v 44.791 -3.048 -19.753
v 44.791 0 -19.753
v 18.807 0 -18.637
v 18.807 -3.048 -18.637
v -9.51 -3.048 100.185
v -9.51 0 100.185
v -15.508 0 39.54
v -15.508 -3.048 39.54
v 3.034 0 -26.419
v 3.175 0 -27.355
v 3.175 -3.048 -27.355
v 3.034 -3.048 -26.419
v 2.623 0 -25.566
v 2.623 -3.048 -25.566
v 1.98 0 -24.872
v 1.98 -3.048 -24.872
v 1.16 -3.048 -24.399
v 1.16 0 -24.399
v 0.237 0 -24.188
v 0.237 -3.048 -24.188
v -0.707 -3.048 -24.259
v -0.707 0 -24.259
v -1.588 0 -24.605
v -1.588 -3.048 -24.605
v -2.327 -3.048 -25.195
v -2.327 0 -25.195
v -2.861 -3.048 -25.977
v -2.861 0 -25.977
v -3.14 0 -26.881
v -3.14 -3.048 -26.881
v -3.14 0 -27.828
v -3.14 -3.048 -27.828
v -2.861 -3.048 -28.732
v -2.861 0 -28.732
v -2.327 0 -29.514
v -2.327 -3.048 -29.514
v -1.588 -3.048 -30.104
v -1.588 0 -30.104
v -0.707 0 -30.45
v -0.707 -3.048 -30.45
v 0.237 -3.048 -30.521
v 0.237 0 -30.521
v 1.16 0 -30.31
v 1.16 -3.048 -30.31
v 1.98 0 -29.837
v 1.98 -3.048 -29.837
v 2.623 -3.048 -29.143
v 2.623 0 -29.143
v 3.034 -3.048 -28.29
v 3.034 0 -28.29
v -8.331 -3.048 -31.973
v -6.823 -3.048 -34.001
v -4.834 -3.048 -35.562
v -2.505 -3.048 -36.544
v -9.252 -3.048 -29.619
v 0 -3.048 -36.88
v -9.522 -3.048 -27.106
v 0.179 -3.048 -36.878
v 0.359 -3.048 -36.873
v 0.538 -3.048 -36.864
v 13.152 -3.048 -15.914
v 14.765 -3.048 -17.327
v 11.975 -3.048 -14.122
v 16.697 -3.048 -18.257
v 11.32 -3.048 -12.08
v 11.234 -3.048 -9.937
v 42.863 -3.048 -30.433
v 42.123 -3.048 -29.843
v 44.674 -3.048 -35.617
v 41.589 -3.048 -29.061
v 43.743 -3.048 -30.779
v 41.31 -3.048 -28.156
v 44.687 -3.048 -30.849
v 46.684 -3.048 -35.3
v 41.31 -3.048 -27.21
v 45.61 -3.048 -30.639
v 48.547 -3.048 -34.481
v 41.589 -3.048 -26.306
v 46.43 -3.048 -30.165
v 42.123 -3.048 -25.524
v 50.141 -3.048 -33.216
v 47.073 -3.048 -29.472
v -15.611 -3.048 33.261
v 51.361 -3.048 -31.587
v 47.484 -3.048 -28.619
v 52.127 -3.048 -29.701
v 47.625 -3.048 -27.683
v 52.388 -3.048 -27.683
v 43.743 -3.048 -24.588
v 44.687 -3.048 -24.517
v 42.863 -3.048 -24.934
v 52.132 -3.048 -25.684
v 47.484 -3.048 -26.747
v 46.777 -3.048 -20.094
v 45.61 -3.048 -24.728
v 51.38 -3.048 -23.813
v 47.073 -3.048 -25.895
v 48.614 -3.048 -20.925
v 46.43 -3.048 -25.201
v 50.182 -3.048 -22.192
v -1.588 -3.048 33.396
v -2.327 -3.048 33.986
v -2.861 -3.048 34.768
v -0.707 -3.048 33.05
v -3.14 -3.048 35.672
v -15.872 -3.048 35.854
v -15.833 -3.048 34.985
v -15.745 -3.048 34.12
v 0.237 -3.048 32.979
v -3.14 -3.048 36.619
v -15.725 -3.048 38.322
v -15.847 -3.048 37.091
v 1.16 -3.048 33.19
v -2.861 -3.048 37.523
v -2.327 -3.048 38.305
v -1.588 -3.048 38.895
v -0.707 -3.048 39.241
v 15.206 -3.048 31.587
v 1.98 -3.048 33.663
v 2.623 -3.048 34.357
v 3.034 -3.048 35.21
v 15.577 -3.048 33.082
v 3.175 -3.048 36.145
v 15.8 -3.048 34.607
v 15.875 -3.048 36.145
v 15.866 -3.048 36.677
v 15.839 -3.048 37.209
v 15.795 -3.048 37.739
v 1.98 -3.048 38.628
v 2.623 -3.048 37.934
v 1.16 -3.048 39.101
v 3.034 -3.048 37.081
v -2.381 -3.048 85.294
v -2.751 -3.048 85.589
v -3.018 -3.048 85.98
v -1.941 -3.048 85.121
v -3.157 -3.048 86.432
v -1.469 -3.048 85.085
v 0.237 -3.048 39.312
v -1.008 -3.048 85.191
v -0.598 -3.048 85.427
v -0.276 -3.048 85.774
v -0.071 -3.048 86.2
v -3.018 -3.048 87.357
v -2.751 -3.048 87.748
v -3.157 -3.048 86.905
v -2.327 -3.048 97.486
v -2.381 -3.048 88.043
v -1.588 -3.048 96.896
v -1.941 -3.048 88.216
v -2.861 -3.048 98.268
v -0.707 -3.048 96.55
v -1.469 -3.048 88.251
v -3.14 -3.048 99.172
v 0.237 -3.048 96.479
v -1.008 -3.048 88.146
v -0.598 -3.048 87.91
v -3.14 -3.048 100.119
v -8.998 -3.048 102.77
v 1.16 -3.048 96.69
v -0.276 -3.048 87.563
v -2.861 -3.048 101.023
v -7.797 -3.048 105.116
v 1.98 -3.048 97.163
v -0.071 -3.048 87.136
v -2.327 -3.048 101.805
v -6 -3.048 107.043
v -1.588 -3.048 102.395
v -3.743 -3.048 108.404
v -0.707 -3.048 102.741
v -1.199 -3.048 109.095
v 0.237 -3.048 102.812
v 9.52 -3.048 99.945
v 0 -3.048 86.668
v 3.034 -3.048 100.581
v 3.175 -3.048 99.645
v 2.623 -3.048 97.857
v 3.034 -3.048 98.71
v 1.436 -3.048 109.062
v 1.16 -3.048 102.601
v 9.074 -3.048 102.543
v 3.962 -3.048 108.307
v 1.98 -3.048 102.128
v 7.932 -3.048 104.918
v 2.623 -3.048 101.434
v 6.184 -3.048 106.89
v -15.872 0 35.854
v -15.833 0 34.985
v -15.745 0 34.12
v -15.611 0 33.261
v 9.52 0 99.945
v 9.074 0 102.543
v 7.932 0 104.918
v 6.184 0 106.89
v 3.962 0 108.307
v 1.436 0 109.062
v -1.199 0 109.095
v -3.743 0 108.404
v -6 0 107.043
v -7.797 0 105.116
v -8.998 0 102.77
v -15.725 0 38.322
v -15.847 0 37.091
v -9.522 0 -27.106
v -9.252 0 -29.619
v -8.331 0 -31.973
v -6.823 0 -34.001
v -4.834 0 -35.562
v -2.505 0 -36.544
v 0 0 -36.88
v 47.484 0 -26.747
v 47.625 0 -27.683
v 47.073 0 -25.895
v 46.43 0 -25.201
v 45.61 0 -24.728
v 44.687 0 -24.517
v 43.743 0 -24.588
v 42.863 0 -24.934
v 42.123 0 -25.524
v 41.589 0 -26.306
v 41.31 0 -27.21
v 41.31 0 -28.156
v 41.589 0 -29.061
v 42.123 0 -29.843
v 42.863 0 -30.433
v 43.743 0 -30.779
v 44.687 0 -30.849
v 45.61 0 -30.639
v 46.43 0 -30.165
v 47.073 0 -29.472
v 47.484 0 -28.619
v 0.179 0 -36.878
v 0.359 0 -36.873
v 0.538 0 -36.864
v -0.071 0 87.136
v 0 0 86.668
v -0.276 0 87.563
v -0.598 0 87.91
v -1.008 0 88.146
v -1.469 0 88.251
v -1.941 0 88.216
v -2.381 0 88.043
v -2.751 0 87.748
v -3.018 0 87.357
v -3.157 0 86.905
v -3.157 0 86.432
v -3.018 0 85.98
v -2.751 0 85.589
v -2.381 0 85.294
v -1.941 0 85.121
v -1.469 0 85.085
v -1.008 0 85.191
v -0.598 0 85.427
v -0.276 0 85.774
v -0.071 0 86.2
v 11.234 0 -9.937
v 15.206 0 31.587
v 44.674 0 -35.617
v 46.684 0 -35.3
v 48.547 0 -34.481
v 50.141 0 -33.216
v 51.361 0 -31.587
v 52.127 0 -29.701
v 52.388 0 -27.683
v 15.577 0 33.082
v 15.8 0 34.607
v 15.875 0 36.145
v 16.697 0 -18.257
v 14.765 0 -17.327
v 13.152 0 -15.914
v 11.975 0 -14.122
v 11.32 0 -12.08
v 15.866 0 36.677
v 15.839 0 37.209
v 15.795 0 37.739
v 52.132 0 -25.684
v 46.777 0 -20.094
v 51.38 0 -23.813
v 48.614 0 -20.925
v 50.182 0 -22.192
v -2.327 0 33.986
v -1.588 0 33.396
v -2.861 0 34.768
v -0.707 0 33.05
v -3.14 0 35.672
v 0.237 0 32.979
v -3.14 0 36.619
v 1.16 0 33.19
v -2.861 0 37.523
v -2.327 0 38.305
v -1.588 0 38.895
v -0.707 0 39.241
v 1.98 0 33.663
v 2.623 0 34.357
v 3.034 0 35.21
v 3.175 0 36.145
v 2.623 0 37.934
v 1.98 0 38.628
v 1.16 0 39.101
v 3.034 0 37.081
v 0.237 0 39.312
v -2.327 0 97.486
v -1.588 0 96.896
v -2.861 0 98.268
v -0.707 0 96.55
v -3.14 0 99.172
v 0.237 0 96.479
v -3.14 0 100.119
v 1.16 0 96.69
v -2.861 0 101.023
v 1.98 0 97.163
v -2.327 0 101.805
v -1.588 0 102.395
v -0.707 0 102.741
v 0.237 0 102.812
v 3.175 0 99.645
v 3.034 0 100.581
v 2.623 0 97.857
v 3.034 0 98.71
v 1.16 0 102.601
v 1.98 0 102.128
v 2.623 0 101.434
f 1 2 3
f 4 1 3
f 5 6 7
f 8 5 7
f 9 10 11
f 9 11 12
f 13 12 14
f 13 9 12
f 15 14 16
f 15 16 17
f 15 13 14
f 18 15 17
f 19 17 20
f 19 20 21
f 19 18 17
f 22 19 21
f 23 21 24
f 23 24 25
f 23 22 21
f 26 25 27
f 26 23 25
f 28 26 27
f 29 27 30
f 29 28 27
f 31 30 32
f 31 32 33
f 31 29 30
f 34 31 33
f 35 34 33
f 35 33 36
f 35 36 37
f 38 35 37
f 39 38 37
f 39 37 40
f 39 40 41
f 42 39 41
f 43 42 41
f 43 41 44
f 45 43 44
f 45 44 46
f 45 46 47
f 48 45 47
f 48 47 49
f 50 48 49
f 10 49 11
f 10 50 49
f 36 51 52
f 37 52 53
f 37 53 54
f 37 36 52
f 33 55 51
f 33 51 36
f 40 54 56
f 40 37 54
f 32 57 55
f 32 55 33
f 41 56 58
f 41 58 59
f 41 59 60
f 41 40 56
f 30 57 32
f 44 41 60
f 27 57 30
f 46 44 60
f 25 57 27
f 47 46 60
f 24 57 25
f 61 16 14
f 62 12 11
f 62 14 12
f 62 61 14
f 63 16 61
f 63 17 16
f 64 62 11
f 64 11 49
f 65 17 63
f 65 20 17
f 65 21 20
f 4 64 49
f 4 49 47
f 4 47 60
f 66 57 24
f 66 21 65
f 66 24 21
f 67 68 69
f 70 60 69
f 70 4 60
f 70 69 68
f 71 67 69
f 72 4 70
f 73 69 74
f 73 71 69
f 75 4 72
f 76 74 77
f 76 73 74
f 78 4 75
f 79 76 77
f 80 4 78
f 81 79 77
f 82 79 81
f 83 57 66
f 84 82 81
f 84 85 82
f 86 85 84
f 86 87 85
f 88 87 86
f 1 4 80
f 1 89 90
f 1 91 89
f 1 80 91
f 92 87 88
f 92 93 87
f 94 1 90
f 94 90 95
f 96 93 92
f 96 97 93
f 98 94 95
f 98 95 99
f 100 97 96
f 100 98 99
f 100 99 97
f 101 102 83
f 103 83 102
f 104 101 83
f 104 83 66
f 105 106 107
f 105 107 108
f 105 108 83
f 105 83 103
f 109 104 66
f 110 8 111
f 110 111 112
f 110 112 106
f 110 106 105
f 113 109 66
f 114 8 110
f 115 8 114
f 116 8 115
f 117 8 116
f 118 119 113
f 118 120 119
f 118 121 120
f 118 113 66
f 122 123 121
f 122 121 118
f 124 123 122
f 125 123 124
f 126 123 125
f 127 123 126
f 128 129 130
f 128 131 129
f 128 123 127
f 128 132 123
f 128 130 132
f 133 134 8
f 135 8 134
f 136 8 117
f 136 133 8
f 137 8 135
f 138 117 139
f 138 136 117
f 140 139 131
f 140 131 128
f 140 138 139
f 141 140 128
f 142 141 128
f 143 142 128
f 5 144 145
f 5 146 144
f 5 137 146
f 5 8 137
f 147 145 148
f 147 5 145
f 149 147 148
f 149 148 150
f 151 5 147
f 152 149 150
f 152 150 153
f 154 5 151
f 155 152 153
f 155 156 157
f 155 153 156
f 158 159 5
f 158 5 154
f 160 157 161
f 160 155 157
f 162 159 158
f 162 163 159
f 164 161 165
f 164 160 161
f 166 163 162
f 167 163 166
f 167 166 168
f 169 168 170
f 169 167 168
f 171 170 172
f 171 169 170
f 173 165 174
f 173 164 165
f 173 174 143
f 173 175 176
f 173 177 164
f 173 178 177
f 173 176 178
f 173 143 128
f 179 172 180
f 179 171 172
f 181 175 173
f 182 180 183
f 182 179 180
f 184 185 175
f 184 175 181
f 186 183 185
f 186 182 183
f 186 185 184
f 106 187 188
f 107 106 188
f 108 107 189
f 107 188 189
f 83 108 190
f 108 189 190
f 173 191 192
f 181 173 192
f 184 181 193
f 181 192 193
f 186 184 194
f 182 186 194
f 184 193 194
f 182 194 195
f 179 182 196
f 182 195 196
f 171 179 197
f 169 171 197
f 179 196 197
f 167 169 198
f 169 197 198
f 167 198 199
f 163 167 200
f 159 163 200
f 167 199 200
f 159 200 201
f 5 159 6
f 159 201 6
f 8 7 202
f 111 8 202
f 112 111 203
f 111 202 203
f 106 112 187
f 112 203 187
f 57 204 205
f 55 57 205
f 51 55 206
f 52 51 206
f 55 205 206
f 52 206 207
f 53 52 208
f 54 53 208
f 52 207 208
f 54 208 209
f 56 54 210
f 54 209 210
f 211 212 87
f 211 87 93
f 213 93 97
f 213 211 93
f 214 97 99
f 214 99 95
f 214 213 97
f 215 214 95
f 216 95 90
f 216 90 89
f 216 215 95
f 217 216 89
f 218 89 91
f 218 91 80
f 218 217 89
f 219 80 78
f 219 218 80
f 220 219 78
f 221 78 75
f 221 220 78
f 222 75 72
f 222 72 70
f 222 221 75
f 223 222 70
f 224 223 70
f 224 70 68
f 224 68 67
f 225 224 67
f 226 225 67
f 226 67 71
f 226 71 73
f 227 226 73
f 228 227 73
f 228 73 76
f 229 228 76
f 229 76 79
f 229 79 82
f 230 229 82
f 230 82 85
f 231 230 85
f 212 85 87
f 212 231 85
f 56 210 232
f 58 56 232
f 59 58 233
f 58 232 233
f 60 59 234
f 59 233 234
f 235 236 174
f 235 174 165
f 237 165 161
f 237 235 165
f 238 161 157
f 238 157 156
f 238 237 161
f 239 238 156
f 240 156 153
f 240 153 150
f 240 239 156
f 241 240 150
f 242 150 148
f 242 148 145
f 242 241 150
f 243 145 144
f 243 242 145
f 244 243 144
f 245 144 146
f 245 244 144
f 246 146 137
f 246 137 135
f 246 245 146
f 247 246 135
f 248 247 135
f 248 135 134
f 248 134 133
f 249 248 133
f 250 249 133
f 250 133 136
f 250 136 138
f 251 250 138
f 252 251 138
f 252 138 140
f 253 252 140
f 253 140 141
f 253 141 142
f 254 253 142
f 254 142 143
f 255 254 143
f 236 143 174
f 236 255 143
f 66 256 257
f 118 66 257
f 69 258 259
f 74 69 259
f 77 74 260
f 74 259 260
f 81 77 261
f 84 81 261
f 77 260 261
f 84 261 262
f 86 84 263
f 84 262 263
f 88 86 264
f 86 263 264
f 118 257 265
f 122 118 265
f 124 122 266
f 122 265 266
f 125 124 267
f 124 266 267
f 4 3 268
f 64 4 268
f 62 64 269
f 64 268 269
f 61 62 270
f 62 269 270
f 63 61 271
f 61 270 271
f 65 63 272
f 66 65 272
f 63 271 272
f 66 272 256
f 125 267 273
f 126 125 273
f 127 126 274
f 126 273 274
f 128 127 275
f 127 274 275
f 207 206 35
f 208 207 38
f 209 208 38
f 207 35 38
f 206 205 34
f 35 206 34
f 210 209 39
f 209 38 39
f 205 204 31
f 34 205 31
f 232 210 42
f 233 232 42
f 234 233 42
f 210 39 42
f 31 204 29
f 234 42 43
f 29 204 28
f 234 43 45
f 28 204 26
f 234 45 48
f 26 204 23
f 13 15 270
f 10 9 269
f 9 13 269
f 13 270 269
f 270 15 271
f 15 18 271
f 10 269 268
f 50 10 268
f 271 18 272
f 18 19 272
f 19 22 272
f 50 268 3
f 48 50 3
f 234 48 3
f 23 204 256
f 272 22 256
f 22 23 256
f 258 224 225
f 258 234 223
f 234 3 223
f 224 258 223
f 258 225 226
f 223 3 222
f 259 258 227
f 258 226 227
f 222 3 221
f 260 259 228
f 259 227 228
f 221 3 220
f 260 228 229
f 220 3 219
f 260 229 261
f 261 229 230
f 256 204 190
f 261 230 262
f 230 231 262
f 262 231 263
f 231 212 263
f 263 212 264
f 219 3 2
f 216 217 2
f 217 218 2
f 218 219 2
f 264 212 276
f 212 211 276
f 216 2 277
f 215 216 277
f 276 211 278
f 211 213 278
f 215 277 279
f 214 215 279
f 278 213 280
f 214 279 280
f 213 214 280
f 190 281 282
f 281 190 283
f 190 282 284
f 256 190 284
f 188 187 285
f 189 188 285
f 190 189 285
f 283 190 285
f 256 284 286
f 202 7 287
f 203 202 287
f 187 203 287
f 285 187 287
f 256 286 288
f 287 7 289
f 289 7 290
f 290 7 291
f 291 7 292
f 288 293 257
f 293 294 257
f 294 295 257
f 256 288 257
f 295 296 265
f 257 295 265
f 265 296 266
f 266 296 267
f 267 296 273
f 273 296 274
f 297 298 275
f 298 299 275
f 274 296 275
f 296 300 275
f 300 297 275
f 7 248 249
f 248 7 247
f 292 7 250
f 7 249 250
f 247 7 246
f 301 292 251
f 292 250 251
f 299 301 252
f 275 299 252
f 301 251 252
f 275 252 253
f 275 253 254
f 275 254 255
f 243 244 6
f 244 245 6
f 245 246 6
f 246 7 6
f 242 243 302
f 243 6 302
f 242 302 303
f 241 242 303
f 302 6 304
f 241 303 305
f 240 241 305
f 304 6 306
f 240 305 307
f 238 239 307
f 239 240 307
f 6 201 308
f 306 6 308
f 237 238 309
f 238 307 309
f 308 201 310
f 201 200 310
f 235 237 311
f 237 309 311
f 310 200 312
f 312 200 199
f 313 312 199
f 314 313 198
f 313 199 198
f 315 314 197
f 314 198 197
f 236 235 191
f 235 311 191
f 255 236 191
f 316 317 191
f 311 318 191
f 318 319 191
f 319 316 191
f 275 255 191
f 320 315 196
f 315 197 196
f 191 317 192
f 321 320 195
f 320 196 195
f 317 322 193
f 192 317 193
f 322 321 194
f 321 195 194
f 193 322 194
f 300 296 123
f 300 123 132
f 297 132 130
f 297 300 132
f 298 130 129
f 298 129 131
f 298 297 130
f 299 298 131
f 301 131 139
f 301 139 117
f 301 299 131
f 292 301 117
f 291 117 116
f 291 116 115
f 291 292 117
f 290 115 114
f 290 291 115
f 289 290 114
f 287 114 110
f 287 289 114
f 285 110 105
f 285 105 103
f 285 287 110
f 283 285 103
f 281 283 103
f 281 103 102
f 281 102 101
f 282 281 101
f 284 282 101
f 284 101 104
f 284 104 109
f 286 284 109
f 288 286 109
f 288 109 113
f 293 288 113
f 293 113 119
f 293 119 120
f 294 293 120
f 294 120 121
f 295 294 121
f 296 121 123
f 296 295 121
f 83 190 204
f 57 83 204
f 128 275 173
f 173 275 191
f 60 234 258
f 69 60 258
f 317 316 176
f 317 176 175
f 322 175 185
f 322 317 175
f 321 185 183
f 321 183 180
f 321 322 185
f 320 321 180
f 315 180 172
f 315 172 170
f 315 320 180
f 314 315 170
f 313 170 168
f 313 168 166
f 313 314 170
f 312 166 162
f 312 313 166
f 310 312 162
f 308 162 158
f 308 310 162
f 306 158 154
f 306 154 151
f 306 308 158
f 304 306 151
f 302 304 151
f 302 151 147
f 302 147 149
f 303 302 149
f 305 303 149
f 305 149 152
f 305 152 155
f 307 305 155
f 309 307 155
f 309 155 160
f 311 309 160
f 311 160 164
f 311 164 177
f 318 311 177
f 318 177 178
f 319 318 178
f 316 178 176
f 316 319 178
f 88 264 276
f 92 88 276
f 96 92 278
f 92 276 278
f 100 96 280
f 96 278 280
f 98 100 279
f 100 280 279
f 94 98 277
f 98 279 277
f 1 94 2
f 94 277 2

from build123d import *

# Parameters (mm, degrees)
F0_R     = 3.175
F0_R_2   = 1.5875
F1_DEPTH = 3.048


with BuildPart() as f1:
    # F0 (on Front) → F1 (new body)
    with BuildSketch(Plane.XZ):
        with BuildLine():
            ThreePointArc((-9.5097297278, 100.1845862784), (-0.2696751221, 90.1242705795), (9.525, 99.6454522461))
            ThreePointArc((9.525, 99.6454522461), (9.5238201928, 99.7953653394), (9.5202810634, 99.9452412949))
            ThreePointArc((9.5202810634, 99.9452412949), (0.1197887221, 109.1696989702), (-9.5097297278, 100.1845862784))
        make_face()
        with Locations((0, 99.6454522461)):
            Circle(F0_R, mode=Mode.SUBTRACT)
        with BuildLine():
            ThreePointArc((9.5202810634, 99.9452412949), (9.5238201928, 99.7953653394), (9.525, 99.6454522461))
            ThreePointArc((9.525, 99.6454522461), (-0.2696751221, 90.1242705795), (-9.5097297278, 100.1845862784))
            Line((-9.5097297278, 100.1845862784), (-15.5077525398, 39.540336068))
            ThreePointArc((-15.5077525398, 39.540336068), (0.9122205372, 51.9942212422), (15.7948542636, 37.7386263705))
            Line((15.7948542636, 37.7386263705), (9.5202810634, 99.9452412949))
        make_face()
        with Locations((-1.5875, 86.6684019566)):
            Circle(F0_R_2, mode=Mode.SUBTRACT)
        with BuildLine():
            Line((15.2064214472, 31.5869029408), (15.7948542636, 37.7386263705))
            ThreePointArc((15.7948542636, 37.7386263705), (0.9122205372, 51.9942212422), (-15.5077525398, 39.540336068))
            Line((-15.5077525398, 39.540336068), (-15.8723283432, 35.854217003))
            Line((-15.8723283432, 35.854217003), (-15.610768577, 33.2610927966))
            ThreePointArc((-15.610768577, 33.2610927966), (-0.8611632068, 20.2938270003), (15.2064214472, 31.5869029408))
        make_face()
        with Locations((0, 36.1454522461)):
            Circle(F0_R, mode=Mode.SUBTRACT)
        with BuildLine():
            ThreePointArc((15.875, 36.1454522461), (15.8549509056, 36.9430466182), (15.7948542636, 37.7386263705))
            Line((15.7948542636, 37.7386263705), (15.2064214472, 31.5869029408))
            ThreePointArc((15.2064214472, 31.5869029408), (15.7069660577, 33.8417937943), (15.875, 36.1454522461))
        make_face()
        with BuildLine():
            Line((-15.8723283432, 35.854217003), (-15.5077525398, 39.540336068))
            ThreePointArc((-15.5077525398, 39.540336068), (-15.797918771, 37.7079462474), (-15.8723283432, 35.854217003))
        make_face()
        with BuildLine():
            Line((11.2344941696, -9.9372905003), (15.2064214472, 31.5869029408))
            ThreePointArc((15.2064214472, 31.5869029408), (-0.8611632068, 20.2938270003), (-15.610768577, 33.2610927966))
            Line((-15.610768577, 33.2610927966), (-9.5217535723, -27.1058835037))
            ThreePointArc((-9.5217535723, -27.1058835037), (0.1243427206, -17.8303593954), (9.525, -27.3545477539))
            ThreePointArc((9.525, -27.3545477539), (6.9227046125, -33.8968551334), (0.5377483785, -36.8643559371))
            Line((0.5377483785, -36.8643559371), (44.6741512192, -35.6174676663))
            ThreePointArc((44.6741512192, -35.6174676663), (36.5127135943, -27.6249029998), (44.7905380327, -19.7529415784))
            Line((44.7905380327, -19.7529415784), (18.8074885558, -18.6371783145))
            ThreePointArc((18.8074885558, -18.6371783145), (13.1519949788, -15.9141403429), (11.2344941696, -9.9372905003))
        make_face()
        with BuildLine():
            Line((-15.610768577, 33.2610927966), (-15.8723283432, 35.854217003))
            ThreePointArc((-15.8723283432, 35.854217003), (-15.7948542636, 34.5522781217), (-15.610768577, 33.2610927966))
        make_face()
        with BuildLine():
            ThreePointArc((9.525, -27.3545477539), (0.1243427206, -17.8303593954), (-9.5217535723, -27.1058835037))
            ThreePointArc((-9.5217535723, -27.1058835037), (-6.8225417545, -34.0012423466), (0, -36.8795477539))
            Line((0, -36.8795477539), (0.5377483785, -36.8643559371))
            ThreePointArc((0.5377483785, -36.8643559371), (6.9227046125, -33.8968551334), (9.525, -27.3545477539))
        make_face()
        with Locations((0, -27.3545477539)):
            Circle(F0_R, mode=Mode.SUBTRACT)
        with BuildLine():
            Line((0.5377483785, -36.8643559371), (0, -36.8795477539))
            ThreePointArc((0, -36.8795477539), (0.2689814631, -36.8757490422), (0.5377483785, -36.8643559371))
        make_face()
        with BuildLine():
            ThreePointArc((52.3875, -27.6831332594), (50.1817940858, -22.1921913723), (44.7905380327, -19.7529415784))
            ThreePointArc((44.7905380327, -19.7529415784), (36.5127135943, -27.6249029998), (44.6741512192, -35.6174676663))
            ThreePointArc((44.6741512192, -35.6174676663), (50.1413577709, -33.2159763779), (52.3875, -27.6831332594))
        make_face()
        with Locations((44.45, -27.6831332594)):
            Circle(F0_R, mode=Mode.SUBTRACT)
    extrude(amount=F1_DEPTH)


solid = f1.part
